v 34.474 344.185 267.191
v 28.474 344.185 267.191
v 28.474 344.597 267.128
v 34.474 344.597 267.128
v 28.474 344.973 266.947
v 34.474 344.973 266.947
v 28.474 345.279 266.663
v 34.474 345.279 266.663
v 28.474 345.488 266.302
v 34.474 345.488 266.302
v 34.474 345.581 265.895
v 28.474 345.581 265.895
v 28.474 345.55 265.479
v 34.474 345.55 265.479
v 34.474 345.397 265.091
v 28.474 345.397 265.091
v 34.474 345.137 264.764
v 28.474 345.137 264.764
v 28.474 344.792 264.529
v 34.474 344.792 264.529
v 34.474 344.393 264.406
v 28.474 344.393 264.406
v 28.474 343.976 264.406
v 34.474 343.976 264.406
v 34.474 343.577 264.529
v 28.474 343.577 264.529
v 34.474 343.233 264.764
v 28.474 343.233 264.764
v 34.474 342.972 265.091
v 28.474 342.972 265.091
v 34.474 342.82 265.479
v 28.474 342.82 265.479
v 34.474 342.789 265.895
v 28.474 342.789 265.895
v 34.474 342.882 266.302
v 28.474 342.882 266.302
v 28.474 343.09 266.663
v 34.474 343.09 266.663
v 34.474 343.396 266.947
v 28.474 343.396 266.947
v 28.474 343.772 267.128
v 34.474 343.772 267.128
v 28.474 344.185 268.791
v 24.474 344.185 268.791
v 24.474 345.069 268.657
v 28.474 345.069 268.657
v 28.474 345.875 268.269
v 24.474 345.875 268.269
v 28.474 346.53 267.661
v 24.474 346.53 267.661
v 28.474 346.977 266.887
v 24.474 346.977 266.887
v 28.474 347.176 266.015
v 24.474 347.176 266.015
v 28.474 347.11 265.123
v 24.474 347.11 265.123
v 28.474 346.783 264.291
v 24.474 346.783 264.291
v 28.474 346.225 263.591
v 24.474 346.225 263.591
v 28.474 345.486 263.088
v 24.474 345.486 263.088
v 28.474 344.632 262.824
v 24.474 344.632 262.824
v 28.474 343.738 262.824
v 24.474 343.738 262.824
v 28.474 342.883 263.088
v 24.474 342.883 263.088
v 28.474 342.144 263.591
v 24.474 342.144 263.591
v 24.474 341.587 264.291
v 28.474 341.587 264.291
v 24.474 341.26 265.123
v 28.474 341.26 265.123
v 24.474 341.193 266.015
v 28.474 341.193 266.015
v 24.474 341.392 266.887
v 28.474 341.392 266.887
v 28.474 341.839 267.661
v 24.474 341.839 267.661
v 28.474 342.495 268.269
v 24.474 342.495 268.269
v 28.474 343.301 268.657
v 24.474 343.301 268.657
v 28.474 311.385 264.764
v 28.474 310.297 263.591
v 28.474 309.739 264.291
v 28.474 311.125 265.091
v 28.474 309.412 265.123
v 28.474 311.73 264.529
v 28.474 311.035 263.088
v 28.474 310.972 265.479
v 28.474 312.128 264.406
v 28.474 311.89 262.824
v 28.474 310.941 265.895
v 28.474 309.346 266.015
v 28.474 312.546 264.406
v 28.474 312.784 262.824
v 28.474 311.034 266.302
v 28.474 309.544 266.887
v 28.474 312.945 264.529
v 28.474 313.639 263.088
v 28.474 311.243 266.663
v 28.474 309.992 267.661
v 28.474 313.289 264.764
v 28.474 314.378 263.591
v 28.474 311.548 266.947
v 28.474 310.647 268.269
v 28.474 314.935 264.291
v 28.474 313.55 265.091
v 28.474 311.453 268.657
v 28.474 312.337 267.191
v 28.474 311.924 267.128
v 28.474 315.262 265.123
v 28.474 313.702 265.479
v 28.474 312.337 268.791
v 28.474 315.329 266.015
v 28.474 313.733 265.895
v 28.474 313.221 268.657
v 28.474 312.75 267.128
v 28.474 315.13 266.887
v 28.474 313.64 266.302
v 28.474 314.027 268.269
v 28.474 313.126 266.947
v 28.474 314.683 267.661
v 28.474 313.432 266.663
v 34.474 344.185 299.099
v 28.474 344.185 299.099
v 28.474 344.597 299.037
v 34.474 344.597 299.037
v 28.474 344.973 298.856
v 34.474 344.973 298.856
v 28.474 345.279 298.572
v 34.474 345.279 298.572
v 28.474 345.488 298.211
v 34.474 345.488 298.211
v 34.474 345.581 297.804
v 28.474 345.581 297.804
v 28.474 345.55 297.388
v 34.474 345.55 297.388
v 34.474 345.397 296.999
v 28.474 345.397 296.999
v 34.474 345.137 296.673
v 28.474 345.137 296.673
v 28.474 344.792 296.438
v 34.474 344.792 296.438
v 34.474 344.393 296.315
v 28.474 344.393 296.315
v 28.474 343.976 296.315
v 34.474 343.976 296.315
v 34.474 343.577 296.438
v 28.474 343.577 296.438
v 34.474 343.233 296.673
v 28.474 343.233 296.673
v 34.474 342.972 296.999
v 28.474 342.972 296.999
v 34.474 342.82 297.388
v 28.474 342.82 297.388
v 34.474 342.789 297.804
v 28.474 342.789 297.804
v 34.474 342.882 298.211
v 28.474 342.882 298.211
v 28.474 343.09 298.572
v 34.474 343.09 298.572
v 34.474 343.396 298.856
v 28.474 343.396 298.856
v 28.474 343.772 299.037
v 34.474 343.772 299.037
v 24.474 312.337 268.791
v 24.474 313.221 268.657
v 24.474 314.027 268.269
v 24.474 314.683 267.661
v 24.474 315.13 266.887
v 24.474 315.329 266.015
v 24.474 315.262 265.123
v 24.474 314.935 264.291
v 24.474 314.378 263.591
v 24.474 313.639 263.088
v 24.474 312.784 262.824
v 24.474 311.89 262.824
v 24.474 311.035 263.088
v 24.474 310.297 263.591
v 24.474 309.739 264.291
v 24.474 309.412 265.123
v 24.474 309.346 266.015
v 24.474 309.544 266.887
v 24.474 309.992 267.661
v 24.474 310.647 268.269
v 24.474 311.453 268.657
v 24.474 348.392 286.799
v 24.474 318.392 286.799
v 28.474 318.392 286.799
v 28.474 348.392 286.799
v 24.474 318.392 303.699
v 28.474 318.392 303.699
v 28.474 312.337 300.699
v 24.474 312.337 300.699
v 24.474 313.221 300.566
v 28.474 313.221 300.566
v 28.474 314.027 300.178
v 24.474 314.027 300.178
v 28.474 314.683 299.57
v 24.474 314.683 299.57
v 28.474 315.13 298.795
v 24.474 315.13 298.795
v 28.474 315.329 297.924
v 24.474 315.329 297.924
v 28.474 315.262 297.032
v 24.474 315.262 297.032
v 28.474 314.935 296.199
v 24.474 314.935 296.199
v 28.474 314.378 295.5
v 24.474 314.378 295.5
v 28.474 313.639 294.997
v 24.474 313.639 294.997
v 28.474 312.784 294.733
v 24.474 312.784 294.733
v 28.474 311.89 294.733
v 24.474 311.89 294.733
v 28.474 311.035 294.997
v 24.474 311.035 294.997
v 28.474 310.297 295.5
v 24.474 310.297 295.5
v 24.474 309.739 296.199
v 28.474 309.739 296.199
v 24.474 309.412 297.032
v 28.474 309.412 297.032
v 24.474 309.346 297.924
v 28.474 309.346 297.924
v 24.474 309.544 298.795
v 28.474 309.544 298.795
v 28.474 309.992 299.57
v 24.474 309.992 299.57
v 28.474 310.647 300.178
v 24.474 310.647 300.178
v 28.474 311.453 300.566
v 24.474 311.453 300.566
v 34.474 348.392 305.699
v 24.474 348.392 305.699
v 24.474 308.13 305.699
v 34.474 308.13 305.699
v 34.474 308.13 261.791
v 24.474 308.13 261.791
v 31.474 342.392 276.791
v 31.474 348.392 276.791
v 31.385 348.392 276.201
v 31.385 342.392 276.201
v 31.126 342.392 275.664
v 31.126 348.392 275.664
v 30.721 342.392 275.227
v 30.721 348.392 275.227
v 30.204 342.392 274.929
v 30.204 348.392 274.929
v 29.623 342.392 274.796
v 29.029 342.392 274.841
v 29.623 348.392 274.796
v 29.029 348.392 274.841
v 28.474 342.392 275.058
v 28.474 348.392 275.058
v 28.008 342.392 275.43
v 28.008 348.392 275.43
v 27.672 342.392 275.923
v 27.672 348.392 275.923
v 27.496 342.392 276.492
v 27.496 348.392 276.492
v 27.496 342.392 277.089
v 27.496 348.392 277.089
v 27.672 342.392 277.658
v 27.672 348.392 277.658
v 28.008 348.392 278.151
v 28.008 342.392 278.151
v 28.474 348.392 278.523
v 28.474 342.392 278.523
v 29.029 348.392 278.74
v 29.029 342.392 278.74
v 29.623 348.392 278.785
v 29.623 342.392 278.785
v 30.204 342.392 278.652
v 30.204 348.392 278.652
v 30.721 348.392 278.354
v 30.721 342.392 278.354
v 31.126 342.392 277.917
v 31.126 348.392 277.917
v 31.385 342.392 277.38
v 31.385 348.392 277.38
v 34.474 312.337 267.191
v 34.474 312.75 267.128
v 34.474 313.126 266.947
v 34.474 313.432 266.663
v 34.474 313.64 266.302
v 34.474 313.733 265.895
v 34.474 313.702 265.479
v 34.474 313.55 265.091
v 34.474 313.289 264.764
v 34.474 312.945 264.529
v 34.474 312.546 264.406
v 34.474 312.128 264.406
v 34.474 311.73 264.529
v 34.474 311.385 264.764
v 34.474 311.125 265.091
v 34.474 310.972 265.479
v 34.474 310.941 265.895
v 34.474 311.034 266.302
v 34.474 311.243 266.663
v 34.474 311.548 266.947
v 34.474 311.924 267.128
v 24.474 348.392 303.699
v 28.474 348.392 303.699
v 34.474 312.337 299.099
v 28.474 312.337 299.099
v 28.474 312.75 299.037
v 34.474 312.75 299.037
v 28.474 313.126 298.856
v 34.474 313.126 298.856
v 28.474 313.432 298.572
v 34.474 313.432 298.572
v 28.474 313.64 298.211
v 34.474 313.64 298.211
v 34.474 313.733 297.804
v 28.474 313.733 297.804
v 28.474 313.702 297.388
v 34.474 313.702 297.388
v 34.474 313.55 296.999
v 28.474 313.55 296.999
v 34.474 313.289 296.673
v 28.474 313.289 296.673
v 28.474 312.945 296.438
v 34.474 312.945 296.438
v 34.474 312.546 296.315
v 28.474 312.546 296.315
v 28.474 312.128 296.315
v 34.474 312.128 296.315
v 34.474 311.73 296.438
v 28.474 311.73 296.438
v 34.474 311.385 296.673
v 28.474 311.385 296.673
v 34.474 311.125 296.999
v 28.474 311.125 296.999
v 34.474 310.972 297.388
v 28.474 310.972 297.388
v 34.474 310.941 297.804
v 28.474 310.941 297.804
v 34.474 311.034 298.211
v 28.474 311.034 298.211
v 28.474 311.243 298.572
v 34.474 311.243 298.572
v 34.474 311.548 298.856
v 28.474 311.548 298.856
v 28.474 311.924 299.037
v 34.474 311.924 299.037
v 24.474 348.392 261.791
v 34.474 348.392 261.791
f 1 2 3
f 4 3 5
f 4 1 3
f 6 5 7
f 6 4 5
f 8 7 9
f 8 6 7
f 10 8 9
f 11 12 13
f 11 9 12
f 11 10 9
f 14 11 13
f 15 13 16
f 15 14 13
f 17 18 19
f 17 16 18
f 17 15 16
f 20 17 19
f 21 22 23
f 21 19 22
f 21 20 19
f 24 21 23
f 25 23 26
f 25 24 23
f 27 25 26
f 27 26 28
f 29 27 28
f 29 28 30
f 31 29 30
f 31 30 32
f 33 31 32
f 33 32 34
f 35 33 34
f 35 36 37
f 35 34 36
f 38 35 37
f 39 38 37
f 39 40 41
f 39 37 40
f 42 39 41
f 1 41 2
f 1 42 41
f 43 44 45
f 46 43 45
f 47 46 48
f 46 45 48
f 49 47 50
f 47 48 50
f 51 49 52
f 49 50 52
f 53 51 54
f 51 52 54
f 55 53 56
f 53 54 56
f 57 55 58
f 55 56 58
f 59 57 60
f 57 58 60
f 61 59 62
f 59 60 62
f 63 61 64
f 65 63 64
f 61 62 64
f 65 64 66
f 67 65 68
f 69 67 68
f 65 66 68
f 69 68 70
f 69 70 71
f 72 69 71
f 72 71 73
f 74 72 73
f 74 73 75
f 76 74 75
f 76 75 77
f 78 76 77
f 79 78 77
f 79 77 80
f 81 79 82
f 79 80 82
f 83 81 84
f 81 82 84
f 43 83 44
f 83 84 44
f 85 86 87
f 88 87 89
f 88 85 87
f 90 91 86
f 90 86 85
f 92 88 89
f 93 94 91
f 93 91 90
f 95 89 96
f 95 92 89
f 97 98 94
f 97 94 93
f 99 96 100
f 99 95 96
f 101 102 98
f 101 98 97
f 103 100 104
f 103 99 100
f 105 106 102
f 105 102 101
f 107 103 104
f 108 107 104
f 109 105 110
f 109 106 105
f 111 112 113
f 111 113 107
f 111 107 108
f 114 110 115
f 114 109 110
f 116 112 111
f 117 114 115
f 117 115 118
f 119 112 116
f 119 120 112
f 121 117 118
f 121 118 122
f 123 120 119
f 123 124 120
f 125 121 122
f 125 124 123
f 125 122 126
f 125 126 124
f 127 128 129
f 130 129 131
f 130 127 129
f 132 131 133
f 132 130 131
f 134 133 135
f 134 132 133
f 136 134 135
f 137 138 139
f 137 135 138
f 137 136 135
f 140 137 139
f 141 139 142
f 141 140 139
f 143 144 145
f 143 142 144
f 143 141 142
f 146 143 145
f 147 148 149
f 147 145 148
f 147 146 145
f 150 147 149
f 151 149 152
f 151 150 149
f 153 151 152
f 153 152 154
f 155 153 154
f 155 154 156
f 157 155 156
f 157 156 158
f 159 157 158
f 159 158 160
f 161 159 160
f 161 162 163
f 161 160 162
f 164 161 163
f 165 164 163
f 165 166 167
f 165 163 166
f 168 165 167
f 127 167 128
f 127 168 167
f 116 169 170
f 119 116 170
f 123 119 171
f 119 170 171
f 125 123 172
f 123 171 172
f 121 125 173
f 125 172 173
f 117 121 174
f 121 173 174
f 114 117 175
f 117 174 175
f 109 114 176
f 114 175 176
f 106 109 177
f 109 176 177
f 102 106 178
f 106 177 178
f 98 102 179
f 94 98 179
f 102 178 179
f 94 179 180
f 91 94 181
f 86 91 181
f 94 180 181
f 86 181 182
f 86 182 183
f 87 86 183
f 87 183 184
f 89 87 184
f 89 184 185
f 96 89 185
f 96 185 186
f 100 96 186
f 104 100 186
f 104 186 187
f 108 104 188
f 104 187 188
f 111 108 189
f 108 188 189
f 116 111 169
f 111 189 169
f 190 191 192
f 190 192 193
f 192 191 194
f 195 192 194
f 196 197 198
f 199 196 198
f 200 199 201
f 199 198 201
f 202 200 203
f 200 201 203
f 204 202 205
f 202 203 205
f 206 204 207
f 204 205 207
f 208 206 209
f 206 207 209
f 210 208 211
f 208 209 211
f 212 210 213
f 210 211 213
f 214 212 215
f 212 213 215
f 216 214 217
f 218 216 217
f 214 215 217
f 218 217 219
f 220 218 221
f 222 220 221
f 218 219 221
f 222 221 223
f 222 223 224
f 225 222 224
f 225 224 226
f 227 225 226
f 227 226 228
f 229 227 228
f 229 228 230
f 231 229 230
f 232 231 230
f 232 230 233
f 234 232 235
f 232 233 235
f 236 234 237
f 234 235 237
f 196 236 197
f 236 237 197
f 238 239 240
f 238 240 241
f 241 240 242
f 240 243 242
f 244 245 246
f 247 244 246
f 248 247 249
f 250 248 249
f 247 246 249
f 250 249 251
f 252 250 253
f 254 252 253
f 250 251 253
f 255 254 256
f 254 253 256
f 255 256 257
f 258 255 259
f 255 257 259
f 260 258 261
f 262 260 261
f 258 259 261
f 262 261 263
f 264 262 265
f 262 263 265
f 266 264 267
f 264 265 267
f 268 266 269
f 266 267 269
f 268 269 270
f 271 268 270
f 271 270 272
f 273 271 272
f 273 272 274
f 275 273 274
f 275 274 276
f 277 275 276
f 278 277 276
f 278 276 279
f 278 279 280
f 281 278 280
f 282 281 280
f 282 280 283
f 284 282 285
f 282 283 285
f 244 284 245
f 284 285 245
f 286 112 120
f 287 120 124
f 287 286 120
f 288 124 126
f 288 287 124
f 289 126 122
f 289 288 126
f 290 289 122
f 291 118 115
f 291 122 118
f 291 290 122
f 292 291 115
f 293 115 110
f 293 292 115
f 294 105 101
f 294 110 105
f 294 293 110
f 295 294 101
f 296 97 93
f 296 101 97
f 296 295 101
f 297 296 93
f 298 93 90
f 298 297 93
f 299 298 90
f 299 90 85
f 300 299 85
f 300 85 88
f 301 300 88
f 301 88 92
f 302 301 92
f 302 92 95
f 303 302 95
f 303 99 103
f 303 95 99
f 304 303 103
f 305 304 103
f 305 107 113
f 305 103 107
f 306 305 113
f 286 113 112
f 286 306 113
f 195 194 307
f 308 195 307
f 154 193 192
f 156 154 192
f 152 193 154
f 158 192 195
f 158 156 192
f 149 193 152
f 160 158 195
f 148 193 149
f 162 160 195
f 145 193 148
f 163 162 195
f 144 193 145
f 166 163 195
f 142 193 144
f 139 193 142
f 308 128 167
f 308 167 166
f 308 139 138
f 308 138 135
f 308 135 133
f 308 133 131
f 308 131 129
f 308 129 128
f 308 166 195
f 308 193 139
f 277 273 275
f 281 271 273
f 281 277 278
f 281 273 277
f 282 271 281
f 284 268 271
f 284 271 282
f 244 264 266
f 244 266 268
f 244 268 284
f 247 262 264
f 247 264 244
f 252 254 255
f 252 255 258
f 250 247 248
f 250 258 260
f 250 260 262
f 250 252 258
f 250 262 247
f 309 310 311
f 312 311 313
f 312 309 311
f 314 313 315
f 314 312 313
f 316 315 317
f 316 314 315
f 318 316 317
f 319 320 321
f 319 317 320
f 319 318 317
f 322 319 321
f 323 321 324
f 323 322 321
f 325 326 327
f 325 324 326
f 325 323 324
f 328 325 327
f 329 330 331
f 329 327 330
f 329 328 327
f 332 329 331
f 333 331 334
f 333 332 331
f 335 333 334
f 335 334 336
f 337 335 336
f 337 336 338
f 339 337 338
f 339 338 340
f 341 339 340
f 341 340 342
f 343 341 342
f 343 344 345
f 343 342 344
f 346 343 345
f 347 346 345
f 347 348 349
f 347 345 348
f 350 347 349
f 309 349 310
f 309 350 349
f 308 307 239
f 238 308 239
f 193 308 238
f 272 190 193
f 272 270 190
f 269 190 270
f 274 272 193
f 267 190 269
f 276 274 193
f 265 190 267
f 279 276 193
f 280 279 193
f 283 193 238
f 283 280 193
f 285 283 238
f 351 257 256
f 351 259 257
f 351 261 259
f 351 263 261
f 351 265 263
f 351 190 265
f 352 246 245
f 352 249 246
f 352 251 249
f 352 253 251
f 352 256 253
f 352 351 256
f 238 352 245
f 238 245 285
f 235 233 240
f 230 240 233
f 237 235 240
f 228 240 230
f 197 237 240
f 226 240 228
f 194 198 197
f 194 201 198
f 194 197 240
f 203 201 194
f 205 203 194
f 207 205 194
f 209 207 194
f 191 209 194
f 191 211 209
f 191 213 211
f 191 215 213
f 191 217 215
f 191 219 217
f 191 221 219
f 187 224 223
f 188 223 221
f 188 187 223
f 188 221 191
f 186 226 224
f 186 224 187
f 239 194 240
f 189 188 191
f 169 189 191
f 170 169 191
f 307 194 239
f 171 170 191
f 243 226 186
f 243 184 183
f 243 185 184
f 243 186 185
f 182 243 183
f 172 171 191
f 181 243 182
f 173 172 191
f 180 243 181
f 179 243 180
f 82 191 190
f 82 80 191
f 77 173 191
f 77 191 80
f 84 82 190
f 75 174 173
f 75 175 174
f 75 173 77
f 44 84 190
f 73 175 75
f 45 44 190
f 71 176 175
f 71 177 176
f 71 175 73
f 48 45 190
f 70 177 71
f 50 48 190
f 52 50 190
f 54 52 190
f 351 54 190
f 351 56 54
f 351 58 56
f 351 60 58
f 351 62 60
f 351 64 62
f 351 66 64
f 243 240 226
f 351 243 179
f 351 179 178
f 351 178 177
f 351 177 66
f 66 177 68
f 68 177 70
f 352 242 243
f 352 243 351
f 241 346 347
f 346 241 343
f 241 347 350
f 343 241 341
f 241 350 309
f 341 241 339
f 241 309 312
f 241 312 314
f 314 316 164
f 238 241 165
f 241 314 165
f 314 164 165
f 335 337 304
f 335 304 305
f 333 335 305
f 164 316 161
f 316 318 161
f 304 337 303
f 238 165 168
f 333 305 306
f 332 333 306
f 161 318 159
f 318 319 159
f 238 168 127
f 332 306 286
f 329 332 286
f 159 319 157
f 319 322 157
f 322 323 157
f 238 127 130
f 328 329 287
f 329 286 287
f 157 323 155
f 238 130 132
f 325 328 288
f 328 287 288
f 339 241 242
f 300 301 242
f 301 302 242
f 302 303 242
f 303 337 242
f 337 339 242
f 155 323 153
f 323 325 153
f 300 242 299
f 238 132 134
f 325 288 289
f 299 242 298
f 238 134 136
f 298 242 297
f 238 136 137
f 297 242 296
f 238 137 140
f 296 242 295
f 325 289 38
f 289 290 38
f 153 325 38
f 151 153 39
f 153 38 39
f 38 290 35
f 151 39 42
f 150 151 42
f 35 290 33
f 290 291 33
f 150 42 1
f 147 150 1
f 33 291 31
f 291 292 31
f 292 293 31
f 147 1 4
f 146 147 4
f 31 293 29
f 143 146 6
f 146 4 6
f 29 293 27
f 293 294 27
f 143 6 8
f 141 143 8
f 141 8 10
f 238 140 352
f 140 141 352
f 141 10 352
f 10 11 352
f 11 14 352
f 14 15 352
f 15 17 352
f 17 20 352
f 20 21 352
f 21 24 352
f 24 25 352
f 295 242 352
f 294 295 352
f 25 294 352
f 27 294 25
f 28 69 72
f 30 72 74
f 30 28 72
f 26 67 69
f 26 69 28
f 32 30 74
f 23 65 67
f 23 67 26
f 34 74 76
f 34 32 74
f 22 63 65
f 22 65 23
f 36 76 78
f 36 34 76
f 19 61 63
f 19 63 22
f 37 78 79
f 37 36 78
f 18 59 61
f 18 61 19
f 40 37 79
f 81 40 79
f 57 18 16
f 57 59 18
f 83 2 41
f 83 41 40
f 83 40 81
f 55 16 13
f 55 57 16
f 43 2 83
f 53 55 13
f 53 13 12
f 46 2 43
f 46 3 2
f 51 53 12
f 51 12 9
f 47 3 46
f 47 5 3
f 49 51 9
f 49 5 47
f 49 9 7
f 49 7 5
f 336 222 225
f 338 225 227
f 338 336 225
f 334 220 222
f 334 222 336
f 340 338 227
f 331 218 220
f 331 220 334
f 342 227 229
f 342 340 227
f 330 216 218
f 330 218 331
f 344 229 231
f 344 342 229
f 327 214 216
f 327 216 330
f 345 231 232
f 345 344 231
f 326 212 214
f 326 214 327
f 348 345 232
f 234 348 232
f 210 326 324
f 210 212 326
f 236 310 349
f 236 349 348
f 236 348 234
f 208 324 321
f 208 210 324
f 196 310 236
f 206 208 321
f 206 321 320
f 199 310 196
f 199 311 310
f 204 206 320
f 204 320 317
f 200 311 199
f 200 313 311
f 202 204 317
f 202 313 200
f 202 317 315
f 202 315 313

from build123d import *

# Parameters (mm, degrees)
SKETCH2_W           = 39.908935046
SKETCH2_H           = 40.262877017
SKETCH2_R           = 1.4
BOSS_EXTRUDE1_DEPTH = 10
SKETCH5_R           = 3
CUT_EXTRUDE1_DEPTH  = 4
SKETCH6_W           = 14.9
SKETCH6_H           = 30
CUT_EXTRUDE2_DEPTH  = 4
SKETCH9_W           = 10
SKETCH9_H           = 40.262877017
BOSS_EXTRUDE3_DEPTH = 4
SKETCH10_W          = 2
SKETCH10_H          = 30
CUT_EXTRUDE4_DEPTH  = 4
SKETCH11_R          = 2
CUT_EXTRUDE5_DEPTH  = 6


with BuildPart() as part:
    # Sketch2 → Boss-Extrude1 (new body)
    with BuildSketch(Plane.ZY.offset(-34.473625965)):
        with Locations((281.744986803, 328.260975238)):
            Rectangle(SKETCH2_W, SKETCH2_H)
        with Locations((297.699454326, 344.184836729)):
            Circle(SKETCH2_R, mode=Mode.SUBTRACT)
        with Locations((297.699454326, 312.337113746)):
            Circle(SKETCH2_R, mode=Mode.SUBTRACT)
        with Locations((265.79051928, 312.337113746)):
            Circle(SKETCH2_R, mode=Mode.SUBTRACT)
        with Locations((265.79051928, 344.184836729)):
            Circle(SKETCH2_R, mode=Mode.SUBTRACT)
    extrude(amount=BOSS_EXTRUDE1_DEPTH)

    # Sketch5 → Cut-Extrude1 (cut)
    with BuildSketch(Plane.ZY.offset(-24.473625965)):
        with Locations((297.699454326, 344.074881585)):
            Circle(SKETCH5_R)
        with Locations((265.79051928, 312.337113746)):
            Circle(SKETCH5_R)
        with Locations((297.699454326, 312.337113746)):
            Circle(SKETCH5_R)
        with Locations((265.79051928, 344.184836729)):
            Circle(SKETCH5_R)
    extrude(amount=-CUT_EXTRUDE1_DEPTH, mode=Mode.SUBTRACT)

    # Sketch6 → Cut-Extrude2 (cut)
    with BuildSketch(Plane.ZY.offset(-24.473625965)):
        with Locations((294.249454326, 333.392413746)):
            Rectangle(SKETCH6_W, SKETCH6_H)
    extrude(amount=-CUT_EXTRUDE2_DEPTH, mode=Mode.SUBTRACT)

    # Sketch9 → Boss-Extrude3 (add)
    with BuildSketch(Plane.XY.offset(301.699454326)):
        with Locations((29.473625965, 328.260975238)):
            Rectangle(SKETCH9_W, SKETCH9_H)
    extrude(amount=BOSS_EXTRUDE3_DEPTH)

    # Sketch10 → Cut-Extrude4 (cut)
    with BuildSketch(Plane.ZY.offset(-24.473625965)):
        with Locations((302.699454326, 333.392413746)):
            Rectangle(SKETCH10_W, SKETCH10_H)
    extrude(amount=-CUT_EXTRUDE4_DEPTH, mode=Mode.SUBTRACT)

    # Sketch11 → Cut-Extrude5 (cut)
    with BuildSketch(Plane(origin=(0, 348.392413746, 0), x_dir=(1, 0, 0), z_dir=(0, 1, 0))):
        with Locations((29.473625965, -276.79051928)):
            Circle(SKETCH11_R)
    extrude(amount=-CUT_EXTRUDE5_DEPTH, mode=Mode.SUBTRACT)


solid = part.part
